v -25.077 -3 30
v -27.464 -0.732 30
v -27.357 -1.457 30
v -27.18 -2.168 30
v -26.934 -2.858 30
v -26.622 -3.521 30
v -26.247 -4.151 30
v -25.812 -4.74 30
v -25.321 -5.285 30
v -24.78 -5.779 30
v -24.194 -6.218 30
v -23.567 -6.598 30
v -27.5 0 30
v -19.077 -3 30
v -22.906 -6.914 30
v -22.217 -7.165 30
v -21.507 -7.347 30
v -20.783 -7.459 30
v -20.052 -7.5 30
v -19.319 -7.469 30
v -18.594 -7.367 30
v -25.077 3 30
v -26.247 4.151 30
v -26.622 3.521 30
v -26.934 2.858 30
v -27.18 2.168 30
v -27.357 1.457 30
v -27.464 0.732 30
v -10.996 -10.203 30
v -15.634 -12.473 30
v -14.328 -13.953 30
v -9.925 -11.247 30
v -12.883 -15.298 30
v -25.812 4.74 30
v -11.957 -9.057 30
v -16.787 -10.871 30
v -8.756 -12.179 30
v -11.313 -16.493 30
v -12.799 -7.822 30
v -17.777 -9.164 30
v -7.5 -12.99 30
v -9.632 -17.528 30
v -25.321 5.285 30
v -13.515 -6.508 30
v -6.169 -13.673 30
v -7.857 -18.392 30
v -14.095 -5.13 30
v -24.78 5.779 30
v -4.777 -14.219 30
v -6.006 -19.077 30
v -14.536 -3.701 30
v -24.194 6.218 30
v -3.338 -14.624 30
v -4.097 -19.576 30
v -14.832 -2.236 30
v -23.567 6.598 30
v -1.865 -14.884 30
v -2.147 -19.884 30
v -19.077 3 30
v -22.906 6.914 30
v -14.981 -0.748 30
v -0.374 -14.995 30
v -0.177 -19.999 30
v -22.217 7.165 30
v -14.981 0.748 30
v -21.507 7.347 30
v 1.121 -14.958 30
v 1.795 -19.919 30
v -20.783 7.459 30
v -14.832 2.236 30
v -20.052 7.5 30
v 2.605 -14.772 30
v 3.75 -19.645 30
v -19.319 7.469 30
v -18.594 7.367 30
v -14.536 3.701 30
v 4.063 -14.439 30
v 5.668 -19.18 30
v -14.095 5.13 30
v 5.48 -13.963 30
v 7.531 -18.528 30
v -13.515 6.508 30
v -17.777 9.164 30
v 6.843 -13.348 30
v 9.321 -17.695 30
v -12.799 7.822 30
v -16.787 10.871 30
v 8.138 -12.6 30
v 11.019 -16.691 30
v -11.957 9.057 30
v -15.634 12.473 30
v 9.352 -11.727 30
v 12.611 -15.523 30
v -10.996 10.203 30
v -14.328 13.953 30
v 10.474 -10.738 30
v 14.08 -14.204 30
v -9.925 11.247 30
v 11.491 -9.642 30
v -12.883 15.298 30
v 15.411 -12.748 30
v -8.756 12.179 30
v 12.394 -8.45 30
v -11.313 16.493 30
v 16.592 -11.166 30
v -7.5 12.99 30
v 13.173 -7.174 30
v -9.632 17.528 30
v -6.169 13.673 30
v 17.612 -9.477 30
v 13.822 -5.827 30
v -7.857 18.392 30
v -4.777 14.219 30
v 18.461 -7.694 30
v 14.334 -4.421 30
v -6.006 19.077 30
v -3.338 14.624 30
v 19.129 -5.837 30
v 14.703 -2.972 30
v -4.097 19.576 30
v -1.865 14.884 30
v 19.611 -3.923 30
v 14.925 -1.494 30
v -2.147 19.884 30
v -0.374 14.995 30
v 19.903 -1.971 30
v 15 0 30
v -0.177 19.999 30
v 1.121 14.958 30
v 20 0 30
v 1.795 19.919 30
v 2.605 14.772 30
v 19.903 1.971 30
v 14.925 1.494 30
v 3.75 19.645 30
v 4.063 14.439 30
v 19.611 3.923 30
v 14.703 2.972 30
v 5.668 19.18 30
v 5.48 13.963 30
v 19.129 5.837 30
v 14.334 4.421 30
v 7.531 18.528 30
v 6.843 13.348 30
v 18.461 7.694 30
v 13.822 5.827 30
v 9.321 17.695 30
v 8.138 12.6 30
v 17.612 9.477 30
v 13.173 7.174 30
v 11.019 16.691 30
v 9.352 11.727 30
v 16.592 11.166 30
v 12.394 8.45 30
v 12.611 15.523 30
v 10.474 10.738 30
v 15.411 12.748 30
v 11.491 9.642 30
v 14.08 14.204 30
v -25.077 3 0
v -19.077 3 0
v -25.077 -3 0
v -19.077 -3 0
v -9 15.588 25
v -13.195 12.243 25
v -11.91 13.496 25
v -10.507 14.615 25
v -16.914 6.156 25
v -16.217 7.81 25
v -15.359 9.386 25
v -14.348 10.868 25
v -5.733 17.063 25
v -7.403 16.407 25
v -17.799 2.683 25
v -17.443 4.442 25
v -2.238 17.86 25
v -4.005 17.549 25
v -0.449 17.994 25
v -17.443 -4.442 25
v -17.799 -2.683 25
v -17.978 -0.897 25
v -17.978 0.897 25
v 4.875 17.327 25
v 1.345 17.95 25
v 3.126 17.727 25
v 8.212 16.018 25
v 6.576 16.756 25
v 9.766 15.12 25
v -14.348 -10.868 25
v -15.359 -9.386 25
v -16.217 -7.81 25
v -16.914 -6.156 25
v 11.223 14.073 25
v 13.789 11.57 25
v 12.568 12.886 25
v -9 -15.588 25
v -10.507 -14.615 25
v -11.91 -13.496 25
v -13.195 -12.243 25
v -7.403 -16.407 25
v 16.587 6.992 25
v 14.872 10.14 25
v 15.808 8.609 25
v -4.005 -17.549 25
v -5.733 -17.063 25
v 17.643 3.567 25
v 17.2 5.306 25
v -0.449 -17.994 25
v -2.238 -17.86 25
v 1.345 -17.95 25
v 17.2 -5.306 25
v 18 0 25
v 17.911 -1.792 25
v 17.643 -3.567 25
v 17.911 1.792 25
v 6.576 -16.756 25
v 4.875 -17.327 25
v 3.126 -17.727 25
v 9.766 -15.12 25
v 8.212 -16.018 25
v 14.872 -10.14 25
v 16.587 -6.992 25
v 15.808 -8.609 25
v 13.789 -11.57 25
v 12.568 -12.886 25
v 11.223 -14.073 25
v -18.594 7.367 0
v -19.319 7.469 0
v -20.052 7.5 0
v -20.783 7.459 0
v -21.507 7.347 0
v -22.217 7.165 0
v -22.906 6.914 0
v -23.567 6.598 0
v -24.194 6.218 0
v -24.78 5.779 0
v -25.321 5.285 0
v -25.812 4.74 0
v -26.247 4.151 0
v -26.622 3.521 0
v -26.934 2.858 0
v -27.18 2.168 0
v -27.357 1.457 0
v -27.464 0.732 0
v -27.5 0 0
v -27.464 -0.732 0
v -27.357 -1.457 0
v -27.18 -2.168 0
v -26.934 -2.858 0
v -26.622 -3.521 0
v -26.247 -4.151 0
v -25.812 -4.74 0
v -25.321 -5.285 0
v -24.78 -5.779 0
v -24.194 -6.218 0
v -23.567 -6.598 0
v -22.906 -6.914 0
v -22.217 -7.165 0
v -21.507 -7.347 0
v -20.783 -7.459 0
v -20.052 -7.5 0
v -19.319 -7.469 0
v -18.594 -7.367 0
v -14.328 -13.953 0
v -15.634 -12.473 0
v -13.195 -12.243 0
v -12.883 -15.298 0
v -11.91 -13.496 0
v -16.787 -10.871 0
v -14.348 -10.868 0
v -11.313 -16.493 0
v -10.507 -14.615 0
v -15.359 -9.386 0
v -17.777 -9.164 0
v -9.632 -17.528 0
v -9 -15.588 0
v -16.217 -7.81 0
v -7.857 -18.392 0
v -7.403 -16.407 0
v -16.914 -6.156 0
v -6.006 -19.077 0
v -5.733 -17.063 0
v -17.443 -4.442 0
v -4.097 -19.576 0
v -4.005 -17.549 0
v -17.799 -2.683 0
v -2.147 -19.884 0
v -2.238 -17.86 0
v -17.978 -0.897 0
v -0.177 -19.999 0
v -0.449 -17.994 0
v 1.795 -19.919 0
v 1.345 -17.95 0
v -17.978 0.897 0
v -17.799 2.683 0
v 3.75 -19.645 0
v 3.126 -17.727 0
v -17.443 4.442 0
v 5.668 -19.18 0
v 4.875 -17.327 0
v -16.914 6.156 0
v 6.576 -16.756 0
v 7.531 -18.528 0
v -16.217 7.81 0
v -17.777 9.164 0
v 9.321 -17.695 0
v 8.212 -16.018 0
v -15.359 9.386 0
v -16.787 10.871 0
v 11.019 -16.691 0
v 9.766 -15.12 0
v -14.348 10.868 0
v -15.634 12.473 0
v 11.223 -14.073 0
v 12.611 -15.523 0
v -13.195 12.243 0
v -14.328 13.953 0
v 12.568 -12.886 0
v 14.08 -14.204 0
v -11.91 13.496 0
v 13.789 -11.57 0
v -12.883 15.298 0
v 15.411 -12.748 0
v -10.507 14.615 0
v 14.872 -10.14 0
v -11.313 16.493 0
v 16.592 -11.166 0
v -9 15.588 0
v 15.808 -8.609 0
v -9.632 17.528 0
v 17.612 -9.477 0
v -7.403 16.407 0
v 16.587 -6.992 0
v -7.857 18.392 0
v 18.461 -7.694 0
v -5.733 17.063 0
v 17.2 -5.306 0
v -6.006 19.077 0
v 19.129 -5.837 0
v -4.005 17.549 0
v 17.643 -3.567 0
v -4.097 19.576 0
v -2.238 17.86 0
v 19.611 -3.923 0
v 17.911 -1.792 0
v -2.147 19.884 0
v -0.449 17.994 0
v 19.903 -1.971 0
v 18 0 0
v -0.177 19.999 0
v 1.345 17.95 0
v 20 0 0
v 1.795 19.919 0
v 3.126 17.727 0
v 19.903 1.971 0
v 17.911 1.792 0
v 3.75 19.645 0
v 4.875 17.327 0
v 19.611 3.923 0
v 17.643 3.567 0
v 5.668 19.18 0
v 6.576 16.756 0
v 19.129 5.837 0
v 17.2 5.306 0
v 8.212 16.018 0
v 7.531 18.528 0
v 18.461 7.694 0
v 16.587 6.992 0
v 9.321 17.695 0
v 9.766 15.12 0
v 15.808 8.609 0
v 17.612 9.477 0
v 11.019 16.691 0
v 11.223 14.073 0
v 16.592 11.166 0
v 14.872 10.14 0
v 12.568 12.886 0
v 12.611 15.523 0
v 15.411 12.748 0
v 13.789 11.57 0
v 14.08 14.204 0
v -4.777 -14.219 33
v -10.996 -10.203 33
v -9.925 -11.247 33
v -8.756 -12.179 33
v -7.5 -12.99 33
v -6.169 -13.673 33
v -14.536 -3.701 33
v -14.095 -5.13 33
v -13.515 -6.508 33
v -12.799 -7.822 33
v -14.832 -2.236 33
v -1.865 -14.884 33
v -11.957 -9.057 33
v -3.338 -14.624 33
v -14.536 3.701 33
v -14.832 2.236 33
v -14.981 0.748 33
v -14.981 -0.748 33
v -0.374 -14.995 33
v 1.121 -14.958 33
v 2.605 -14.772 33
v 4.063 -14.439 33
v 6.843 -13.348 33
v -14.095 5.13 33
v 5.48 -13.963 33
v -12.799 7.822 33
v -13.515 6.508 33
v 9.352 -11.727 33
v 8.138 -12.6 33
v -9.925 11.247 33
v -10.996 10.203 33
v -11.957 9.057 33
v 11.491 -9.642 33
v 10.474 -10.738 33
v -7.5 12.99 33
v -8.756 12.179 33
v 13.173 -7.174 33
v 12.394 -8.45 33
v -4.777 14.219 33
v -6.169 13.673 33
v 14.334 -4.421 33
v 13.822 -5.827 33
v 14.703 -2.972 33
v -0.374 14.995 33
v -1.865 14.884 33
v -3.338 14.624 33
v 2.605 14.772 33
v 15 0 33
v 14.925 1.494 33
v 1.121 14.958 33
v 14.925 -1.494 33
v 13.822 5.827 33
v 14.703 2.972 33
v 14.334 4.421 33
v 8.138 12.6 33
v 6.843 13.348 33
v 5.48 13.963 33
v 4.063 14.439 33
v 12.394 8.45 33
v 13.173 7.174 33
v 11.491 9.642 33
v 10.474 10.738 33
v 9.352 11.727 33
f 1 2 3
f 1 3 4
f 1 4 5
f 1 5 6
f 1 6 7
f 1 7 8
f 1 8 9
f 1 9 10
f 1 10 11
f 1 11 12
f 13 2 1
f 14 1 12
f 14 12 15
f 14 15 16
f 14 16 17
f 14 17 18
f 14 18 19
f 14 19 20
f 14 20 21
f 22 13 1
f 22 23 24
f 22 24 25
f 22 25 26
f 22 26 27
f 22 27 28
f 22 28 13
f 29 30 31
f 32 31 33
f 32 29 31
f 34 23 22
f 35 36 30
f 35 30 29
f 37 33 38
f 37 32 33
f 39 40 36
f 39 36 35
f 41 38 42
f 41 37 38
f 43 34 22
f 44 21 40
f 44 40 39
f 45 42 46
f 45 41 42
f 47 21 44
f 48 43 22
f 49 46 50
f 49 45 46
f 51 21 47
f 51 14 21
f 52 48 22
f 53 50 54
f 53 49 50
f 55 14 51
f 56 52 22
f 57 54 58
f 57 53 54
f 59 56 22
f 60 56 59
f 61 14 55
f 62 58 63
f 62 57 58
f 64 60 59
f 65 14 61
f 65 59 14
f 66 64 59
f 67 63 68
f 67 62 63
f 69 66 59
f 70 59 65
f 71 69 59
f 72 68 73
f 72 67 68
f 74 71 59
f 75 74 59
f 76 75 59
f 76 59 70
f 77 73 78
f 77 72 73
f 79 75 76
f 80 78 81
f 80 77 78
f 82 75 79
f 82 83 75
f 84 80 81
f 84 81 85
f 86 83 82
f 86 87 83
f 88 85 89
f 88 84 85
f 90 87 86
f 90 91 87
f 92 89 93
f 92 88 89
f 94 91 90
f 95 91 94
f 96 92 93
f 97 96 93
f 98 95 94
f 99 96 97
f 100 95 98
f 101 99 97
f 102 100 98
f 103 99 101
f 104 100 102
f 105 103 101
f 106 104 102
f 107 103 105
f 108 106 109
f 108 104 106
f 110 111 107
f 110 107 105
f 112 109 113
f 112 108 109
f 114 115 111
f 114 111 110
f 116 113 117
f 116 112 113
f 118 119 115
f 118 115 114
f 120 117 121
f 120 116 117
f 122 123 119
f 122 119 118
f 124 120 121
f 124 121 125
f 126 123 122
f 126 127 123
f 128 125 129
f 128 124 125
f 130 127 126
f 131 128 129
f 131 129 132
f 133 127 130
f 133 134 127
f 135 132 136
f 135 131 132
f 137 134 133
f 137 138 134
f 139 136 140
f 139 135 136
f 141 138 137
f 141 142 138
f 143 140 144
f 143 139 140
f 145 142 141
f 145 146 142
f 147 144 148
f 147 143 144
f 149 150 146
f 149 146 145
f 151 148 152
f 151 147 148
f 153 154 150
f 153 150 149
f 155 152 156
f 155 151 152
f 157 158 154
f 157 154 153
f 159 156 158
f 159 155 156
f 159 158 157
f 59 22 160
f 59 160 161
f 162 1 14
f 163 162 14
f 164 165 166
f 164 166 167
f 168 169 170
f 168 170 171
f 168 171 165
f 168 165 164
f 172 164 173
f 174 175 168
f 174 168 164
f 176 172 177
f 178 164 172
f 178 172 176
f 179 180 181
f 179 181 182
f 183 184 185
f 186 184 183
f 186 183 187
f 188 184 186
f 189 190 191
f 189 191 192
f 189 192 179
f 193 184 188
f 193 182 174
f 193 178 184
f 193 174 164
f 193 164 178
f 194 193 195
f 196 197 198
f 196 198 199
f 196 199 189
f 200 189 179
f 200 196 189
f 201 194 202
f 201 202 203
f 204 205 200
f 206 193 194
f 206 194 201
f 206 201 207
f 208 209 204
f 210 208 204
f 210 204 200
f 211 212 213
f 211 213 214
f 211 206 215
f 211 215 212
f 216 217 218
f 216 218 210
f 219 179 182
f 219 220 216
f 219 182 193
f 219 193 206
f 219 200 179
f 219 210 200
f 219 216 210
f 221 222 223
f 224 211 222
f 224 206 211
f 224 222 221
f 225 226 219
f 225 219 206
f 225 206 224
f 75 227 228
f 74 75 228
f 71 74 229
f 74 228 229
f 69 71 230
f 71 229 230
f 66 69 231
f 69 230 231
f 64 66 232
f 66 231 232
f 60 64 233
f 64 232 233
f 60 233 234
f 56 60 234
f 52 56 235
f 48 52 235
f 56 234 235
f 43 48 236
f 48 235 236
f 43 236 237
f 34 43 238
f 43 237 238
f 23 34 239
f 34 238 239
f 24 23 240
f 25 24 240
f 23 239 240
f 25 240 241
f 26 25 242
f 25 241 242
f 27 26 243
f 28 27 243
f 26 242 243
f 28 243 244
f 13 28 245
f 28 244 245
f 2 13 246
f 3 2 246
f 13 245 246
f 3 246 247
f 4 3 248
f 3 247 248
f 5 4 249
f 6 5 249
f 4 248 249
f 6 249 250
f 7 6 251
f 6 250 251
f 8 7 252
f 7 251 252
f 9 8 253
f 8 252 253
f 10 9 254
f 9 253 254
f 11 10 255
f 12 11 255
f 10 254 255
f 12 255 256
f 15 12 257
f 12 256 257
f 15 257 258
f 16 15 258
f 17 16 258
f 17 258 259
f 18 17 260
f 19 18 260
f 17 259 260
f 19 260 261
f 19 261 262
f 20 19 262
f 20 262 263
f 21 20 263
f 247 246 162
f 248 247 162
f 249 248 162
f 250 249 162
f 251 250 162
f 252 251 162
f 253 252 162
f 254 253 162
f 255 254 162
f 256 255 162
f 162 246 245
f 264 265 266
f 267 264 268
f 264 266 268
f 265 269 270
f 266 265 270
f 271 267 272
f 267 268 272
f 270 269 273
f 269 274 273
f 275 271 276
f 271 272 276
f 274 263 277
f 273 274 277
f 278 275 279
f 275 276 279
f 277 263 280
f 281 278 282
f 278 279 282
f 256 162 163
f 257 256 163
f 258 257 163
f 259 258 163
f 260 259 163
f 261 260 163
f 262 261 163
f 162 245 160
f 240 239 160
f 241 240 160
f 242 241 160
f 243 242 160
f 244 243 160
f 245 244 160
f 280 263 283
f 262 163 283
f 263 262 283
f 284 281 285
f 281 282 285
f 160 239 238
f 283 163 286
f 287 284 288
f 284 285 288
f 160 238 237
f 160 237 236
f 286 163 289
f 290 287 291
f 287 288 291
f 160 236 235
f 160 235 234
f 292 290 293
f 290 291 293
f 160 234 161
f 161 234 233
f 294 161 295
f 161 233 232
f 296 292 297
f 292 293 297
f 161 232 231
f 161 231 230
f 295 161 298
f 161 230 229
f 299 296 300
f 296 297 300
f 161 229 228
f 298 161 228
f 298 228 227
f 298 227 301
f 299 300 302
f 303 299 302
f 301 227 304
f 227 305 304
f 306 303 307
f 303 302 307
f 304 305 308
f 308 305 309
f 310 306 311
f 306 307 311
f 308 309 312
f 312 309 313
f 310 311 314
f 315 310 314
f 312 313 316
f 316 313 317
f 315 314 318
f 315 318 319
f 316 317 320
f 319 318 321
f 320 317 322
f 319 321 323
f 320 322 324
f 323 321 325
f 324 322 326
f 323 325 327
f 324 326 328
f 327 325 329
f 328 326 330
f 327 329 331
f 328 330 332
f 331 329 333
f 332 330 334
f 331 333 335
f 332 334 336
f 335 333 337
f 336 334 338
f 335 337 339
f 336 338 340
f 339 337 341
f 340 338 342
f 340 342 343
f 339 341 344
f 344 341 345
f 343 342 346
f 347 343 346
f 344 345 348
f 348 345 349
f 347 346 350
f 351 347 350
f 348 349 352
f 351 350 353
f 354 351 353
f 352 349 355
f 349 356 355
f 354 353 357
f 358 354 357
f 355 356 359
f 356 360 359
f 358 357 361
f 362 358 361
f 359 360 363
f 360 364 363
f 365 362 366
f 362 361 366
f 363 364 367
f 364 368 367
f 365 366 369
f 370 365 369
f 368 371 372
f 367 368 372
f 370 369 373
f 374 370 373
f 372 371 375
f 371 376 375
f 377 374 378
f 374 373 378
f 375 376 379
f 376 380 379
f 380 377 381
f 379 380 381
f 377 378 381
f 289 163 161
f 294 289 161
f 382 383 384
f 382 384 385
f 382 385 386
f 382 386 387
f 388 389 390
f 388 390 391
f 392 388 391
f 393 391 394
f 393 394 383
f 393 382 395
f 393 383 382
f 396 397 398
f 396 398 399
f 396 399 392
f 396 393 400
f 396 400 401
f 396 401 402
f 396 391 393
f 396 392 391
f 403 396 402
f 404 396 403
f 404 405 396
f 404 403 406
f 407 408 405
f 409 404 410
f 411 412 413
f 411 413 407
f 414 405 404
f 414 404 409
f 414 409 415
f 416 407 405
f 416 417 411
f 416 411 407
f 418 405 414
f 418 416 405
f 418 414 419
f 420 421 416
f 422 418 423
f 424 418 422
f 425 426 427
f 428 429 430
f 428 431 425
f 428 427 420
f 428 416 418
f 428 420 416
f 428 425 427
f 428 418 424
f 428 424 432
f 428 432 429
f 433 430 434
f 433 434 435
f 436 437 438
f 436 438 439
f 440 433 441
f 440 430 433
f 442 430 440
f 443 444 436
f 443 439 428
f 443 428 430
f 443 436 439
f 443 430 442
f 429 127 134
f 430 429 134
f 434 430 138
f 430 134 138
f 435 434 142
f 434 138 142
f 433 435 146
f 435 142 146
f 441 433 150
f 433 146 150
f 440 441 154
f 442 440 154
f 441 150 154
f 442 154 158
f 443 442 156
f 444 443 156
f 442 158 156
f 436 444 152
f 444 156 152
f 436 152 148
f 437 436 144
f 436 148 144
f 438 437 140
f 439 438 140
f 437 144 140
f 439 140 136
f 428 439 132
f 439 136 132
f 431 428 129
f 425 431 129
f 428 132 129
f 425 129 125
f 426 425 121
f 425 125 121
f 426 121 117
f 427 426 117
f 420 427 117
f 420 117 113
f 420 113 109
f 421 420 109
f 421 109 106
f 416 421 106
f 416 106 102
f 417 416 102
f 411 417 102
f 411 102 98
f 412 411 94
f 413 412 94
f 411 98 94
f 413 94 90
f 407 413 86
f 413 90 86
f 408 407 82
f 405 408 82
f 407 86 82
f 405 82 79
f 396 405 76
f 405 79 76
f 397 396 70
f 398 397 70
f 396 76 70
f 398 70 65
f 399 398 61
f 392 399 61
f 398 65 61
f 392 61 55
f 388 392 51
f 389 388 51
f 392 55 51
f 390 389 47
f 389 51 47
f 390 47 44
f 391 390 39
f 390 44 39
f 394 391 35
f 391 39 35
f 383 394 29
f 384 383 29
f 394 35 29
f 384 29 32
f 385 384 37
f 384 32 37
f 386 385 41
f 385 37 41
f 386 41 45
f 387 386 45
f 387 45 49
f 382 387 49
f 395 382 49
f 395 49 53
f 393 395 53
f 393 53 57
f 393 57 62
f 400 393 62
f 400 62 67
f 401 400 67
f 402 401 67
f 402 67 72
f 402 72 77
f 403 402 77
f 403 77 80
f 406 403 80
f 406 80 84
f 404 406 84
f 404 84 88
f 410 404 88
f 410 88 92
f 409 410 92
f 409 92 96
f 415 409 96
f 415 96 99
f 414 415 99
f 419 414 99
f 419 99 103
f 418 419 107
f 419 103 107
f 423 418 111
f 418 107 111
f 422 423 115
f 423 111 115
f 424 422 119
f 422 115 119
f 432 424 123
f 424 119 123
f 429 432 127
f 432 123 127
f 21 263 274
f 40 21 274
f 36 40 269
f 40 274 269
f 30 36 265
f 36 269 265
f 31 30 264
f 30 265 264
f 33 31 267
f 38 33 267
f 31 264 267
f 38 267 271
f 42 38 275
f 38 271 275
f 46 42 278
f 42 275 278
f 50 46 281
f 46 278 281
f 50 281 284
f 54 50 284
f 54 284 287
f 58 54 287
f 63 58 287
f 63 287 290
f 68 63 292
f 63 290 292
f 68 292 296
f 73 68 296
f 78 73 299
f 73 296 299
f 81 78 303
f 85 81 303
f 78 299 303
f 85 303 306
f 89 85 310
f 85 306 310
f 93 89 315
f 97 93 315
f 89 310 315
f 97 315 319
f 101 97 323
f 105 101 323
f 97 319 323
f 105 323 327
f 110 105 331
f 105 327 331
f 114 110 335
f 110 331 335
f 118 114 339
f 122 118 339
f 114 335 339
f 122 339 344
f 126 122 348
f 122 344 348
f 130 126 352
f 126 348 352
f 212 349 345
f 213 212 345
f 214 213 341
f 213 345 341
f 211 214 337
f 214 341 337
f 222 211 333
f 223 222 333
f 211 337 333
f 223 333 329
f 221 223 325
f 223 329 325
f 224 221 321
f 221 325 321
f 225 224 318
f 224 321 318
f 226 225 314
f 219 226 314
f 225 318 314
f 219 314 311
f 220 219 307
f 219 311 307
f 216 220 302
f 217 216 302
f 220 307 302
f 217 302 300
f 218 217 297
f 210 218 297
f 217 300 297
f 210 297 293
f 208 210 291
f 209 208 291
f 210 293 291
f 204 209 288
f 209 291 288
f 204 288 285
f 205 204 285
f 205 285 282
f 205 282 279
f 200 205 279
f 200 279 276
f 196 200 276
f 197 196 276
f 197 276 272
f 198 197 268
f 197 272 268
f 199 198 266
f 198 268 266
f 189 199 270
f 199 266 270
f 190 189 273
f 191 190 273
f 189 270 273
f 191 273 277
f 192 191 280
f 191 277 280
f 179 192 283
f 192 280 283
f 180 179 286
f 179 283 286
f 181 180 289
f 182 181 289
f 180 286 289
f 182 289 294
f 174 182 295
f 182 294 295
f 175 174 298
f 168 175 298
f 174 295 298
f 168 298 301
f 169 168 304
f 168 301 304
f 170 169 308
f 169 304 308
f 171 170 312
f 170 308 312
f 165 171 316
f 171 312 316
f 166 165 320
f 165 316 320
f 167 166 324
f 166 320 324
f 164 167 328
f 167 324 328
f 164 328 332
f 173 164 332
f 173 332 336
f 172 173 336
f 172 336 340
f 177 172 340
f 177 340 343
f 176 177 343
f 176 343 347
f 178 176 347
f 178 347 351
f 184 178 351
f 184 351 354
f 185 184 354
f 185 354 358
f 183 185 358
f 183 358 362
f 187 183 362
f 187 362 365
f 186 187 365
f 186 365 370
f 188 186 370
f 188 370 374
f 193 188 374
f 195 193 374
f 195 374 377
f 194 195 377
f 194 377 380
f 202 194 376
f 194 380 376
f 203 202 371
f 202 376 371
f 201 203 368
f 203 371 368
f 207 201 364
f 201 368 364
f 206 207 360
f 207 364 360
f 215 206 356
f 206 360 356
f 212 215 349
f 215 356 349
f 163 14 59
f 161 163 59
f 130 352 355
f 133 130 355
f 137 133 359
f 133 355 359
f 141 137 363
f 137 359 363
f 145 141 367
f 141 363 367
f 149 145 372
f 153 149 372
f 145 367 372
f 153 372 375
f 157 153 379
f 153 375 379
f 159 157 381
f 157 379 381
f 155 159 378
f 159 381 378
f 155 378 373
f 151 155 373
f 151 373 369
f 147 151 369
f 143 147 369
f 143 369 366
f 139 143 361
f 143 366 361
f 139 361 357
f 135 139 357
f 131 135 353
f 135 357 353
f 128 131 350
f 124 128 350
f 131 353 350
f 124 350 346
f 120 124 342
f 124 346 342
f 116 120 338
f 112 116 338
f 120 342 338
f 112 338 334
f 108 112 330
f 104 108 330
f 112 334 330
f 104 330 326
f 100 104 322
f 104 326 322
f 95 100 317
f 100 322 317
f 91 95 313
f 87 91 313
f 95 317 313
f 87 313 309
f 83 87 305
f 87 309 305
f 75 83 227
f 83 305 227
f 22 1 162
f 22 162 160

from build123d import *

# Parameters (mm, degrees)
F0_R     = 15
F1_DEPTH = 30
F3_R     = 18
F4_DEPTH = 25
F5_R     = 15
F6_DEPTH = 3
F2_W     = 6
F2_H     = 6
F7_DEPTH = 35


with BuildPart() as f1:
    # F0 (on Top) → F1 (new body)
    with BuildSketch(Plane.XY):
        with BuildLine():
            ThreePointArc((-18.59375, -7.366985), (3.75, -19.645292), (20, 0))
            ThreePointArc((20, 0), (3.75, 19.645292), (-18.59375, 7.366985))
            ThreePointArc((-18.59375, 7.366985), (-20, 0), (-18.59375, -7.366985))
        make_face()
        Circle(F0_R, mode=Mode.SUBTRACT)
        with BuildLine():
            ThreePointArc((-18.59375, -7.366985), (-20, 0), (-18.59375, 7.366985))
            ThreePointArc((-18.59375, 7.366985), (-27.5, 0), (-18.59375, -7.366985))
        make_face()
        Circle(F0_R)
    extrude(amount=F1_DEPTH)

    # F3 (on face) → F4 (cut)
    with BuildSketch(Plane(origin=(0, 0, 0), x_dir=(1, 0, 0), z_dir=(0, 0, -1))):
        Circle(F3_R)
    extrude(amount=-F4_DEPTH, mode=Mode.SUBTRACT)

    # F5 (on face) → F6 (join)
    with BuildSketch(Plane.XY.offset(30)):
        Circle(F5_R)
    extrude(amount=F6_DEPTH)

    # F2 (on face) → F7 (cut)
    with BuildSketch(Plane.XY.offset(30)):
        with Locations((-22.077309, 0)):
            Rectangle(F2_W, F2_H)
    extrude(amount=-F7_DEPTH, mode=Mode.SUBTRACT)


solid = f1.part
